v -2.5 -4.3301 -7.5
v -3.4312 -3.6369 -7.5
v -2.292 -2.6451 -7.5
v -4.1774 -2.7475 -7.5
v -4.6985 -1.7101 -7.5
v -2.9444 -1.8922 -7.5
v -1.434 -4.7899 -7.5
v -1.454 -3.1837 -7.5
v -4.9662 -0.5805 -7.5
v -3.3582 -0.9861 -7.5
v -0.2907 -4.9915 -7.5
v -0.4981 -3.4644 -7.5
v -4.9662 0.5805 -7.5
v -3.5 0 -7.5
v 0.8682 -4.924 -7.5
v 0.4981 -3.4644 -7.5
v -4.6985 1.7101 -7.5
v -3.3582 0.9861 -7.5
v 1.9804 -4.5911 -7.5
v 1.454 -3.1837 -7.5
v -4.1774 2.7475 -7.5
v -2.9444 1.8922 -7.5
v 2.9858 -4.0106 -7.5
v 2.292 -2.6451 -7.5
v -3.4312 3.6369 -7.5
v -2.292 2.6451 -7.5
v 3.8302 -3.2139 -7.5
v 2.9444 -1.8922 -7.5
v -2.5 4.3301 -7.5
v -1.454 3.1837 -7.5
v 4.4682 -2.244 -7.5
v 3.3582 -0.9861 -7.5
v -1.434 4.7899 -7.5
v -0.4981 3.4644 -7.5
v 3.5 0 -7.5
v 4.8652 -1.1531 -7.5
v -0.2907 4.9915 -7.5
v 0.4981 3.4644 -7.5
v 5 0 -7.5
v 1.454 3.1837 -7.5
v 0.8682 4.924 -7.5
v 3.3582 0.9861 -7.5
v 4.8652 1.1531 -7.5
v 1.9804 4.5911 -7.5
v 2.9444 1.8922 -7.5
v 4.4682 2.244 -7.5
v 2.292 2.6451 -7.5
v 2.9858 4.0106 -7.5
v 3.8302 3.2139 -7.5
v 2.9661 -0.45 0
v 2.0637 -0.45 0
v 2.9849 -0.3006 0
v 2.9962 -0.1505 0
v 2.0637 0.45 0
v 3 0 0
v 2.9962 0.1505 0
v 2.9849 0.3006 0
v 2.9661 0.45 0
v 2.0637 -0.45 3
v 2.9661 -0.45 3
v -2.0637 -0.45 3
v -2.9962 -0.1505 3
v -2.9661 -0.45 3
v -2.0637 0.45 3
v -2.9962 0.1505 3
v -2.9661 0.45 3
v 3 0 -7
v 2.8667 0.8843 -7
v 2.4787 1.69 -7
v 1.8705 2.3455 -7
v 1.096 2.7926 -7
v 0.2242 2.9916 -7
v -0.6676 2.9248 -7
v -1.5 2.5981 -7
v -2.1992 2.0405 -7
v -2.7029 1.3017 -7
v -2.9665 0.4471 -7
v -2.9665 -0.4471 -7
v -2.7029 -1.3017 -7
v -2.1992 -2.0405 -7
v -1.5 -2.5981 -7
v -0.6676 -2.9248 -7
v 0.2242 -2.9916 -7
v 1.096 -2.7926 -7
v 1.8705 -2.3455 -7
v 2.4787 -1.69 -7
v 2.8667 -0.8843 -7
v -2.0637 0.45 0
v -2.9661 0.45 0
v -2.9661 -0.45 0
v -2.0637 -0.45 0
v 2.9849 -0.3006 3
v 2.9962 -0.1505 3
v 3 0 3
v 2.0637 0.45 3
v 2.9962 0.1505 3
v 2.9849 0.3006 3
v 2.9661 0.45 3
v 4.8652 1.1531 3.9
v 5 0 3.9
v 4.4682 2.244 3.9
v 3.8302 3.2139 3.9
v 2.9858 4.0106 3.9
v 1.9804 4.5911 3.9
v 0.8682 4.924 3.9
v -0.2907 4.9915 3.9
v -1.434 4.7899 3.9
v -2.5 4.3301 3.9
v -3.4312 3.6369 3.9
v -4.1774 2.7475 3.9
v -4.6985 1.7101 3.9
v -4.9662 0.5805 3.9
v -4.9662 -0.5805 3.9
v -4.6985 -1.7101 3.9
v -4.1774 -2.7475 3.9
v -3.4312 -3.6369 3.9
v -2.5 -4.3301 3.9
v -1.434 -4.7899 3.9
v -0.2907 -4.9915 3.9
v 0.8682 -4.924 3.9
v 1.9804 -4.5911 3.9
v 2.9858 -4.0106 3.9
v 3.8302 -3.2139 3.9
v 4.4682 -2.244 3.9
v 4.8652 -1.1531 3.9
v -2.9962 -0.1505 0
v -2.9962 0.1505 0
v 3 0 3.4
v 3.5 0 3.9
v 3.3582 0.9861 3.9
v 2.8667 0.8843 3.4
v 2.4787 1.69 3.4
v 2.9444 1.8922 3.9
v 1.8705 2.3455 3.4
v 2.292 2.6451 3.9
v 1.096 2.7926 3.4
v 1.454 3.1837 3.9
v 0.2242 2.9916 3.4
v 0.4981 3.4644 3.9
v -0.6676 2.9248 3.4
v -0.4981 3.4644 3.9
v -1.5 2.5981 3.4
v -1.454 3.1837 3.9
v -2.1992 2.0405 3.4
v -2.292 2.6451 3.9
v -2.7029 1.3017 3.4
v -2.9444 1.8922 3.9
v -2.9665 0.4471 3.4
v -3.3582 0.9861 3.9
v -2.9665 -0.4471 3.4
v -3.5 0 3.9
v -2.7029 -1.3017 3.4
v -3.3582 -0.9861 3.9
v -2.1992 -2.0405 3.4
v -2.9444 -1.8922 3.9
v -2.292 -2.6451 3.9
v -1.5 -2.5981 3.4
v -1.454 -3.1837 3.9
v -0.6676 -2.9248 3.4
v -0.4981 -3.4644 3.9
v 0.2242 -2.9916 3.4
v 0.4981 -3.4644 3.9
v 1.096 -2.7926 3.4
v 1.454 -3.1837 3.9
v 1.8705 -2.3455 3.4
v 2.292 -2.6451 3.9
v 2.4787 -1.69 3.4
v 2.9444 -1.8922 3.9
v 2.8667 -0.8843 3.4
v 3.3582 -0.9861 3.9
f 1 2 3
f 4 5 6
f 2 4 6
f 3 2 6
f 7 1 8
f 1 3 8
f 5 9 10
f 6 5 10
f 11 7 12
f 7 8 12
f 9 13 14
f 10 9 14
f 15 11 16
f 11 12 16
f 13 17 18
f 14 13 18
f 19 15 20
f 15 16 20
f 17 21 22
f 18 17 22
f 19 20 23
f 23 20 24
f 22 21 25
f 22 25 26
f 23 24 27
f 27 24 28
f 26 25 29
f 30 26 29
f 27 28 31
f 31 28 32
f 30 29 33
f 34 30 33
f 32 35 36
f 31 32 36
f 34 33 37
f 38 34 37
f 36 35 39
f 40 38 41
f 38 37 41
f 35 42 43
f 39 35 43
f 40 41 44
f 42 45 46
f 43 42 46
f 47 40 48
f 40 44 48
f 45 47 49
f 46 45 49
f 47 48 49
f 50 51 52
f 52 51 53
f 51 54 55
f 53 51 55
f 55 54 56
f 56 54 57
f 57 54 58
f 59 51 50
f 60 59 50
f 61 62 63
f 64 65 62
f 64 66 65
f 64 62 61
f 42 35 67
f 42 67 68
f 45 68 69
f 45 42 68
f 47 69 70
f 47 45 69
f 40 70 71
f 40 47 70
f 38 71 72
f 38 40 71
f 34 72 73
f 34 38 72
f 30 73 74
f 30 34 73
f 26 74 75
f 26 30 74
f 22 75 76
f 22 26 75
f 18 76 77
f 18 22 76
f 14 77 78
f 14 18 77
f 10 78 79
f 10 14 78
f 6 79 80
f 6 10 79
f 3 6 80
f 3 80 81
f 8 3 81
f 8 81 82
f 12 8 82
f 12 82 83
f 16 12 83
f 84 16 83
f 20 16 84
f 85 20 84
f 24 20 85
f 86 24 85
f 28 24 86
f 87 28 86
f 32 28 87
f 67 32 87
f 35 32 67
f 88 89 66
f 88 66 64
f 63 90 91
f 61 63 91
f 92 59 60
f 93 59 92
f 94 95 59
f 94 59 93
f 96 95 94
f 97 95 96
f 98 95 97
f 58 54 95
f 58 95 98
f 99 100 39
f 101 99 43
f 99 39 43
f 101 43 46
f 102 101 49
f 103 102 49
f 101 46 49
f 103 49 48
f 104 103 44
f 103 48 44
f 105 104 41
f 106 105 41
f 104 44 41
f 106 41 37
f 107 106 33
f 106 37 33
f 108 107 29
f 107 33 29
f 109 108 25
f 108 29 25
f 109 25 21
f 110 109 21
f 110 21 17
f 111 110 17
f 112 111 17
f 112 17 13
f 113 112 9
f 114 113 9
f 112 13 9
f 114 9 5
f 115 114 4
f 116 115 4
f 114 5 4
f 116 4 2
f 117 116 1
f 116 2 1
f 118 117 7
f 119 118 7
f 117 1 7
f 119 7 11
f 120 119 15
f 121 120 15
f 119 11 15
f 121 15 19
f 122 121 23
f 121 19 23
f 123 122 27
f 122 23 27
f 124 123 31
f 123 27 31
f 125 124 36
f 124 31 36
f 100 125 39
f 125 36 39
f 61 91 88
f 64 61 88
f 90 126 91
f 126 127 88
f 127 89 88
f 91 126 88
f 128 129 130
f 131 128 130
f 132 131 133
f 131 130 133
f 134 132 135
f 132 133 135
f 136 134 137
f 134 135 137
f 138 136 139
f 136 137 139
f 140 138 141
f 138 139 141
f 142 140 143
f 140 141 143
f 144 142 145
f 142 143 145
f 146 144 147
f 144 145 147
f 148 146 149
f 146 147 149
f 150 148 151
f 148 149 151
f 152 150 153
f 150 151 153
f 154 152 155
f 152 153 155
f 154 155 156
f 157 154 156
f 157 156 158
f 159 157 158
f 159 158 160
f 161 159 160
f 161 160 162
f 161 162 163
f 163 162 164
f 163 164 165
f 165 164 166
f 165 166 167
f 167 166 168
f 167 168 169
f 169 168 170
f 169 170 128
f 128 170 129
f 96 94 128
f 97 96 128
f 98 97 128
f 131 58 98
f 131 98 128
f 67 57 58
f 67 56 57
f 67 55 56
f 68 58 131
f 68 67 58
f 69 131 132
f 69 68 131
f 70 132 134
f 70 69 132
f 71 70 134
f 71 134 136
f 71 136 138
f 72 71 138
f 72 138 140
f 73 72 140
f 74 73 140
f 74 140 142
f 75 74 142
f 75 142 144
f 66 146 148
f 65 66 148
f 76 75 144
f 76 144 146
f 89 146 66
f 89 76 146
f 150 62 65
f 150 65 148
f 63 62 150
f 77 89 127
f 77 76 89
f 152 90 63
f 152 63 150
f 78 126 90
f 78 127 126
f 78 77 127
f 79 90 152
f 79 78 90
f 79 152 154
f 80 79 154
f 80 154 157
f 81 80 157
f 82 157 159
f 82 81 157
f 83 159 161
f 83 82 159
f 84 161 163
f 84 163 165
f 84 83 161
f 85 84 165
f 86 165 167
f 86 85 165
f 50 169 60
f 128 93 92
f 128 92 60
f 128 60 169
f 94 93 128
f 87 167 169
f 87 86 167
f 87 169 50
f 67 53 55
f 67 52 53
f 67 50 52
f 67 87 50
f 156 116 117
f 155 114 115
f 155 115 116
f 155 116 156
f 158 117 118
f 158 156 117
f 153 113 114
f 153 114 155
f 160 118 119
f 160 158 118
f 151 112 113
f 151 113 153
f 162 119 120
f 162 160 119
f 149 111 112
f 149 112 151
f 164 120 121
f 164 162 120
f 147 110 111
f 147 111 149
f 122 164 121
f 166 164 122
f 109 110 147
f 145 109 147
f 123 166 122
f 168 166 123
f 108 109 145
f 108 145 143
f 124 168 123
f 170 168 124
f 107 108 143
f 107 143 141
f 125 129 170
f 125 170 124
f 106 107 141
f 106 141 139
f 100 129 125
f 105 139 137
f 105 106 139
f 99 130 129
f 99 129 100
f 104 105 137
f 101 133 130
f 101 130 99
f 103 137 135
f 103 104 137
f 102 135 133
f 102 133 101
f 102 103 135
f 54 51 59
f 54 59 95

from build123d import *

# Parameters (mm, degrees)
EXTRUDE_1_DEPTH      = 3.9
EXTRUDE_1_DEPTH_BACK = 7.5
SKETCH_1_R           = 5
SKETCH_1_R_2         = 3
CHAMFER_1_SIZE       = 0.5
SKETCH_2_W           = 1.242269364
SKETCH_2_H           = 0.9
EXTRUDE_1_2_DEPTH    = 3


with BuildPart() as part:
    # 草图1 → Extrude 1 (new, two sides: drawn at the far end of the back side and taken through both)
    with BuildSketch(Plane.XY.offset(-EXTRUDE_1_DEPTH_BACK)):
        Circle(SKETCH_1_R)
        Circle(SKETCH_1_R_2, mode=Mode.SUBTRACT)
    extrude(amount=EXTRUDE_1_DEPTH + EXTRUDE_1_DEPTH_BACK)

    # 倒角1
    chamfer_1_edges = [part.edges().sort_by_distance(p)[0] for p in [
        (-3, 0, -7.5),
        (-3, 0, 3.9),
    ]]
    chamfer(chamfer_1_edges, length=CHAMFER_1_SIZE)

    # 草图2 → Extrude 1 2 (add)
    with BuildSketch(Plane.XY):
        with Locations((-2.68480736, 0)):
            Rectangle(SKETCH_2_W, SKETCH_2_H)
        with Locations((2.68480736, 0)):
            Rectangle(SKETCH_2_W, SKETCH_2_H)
    extrude(amount=EXTRUDE_1_2_DEPTH)


solid = part.part
